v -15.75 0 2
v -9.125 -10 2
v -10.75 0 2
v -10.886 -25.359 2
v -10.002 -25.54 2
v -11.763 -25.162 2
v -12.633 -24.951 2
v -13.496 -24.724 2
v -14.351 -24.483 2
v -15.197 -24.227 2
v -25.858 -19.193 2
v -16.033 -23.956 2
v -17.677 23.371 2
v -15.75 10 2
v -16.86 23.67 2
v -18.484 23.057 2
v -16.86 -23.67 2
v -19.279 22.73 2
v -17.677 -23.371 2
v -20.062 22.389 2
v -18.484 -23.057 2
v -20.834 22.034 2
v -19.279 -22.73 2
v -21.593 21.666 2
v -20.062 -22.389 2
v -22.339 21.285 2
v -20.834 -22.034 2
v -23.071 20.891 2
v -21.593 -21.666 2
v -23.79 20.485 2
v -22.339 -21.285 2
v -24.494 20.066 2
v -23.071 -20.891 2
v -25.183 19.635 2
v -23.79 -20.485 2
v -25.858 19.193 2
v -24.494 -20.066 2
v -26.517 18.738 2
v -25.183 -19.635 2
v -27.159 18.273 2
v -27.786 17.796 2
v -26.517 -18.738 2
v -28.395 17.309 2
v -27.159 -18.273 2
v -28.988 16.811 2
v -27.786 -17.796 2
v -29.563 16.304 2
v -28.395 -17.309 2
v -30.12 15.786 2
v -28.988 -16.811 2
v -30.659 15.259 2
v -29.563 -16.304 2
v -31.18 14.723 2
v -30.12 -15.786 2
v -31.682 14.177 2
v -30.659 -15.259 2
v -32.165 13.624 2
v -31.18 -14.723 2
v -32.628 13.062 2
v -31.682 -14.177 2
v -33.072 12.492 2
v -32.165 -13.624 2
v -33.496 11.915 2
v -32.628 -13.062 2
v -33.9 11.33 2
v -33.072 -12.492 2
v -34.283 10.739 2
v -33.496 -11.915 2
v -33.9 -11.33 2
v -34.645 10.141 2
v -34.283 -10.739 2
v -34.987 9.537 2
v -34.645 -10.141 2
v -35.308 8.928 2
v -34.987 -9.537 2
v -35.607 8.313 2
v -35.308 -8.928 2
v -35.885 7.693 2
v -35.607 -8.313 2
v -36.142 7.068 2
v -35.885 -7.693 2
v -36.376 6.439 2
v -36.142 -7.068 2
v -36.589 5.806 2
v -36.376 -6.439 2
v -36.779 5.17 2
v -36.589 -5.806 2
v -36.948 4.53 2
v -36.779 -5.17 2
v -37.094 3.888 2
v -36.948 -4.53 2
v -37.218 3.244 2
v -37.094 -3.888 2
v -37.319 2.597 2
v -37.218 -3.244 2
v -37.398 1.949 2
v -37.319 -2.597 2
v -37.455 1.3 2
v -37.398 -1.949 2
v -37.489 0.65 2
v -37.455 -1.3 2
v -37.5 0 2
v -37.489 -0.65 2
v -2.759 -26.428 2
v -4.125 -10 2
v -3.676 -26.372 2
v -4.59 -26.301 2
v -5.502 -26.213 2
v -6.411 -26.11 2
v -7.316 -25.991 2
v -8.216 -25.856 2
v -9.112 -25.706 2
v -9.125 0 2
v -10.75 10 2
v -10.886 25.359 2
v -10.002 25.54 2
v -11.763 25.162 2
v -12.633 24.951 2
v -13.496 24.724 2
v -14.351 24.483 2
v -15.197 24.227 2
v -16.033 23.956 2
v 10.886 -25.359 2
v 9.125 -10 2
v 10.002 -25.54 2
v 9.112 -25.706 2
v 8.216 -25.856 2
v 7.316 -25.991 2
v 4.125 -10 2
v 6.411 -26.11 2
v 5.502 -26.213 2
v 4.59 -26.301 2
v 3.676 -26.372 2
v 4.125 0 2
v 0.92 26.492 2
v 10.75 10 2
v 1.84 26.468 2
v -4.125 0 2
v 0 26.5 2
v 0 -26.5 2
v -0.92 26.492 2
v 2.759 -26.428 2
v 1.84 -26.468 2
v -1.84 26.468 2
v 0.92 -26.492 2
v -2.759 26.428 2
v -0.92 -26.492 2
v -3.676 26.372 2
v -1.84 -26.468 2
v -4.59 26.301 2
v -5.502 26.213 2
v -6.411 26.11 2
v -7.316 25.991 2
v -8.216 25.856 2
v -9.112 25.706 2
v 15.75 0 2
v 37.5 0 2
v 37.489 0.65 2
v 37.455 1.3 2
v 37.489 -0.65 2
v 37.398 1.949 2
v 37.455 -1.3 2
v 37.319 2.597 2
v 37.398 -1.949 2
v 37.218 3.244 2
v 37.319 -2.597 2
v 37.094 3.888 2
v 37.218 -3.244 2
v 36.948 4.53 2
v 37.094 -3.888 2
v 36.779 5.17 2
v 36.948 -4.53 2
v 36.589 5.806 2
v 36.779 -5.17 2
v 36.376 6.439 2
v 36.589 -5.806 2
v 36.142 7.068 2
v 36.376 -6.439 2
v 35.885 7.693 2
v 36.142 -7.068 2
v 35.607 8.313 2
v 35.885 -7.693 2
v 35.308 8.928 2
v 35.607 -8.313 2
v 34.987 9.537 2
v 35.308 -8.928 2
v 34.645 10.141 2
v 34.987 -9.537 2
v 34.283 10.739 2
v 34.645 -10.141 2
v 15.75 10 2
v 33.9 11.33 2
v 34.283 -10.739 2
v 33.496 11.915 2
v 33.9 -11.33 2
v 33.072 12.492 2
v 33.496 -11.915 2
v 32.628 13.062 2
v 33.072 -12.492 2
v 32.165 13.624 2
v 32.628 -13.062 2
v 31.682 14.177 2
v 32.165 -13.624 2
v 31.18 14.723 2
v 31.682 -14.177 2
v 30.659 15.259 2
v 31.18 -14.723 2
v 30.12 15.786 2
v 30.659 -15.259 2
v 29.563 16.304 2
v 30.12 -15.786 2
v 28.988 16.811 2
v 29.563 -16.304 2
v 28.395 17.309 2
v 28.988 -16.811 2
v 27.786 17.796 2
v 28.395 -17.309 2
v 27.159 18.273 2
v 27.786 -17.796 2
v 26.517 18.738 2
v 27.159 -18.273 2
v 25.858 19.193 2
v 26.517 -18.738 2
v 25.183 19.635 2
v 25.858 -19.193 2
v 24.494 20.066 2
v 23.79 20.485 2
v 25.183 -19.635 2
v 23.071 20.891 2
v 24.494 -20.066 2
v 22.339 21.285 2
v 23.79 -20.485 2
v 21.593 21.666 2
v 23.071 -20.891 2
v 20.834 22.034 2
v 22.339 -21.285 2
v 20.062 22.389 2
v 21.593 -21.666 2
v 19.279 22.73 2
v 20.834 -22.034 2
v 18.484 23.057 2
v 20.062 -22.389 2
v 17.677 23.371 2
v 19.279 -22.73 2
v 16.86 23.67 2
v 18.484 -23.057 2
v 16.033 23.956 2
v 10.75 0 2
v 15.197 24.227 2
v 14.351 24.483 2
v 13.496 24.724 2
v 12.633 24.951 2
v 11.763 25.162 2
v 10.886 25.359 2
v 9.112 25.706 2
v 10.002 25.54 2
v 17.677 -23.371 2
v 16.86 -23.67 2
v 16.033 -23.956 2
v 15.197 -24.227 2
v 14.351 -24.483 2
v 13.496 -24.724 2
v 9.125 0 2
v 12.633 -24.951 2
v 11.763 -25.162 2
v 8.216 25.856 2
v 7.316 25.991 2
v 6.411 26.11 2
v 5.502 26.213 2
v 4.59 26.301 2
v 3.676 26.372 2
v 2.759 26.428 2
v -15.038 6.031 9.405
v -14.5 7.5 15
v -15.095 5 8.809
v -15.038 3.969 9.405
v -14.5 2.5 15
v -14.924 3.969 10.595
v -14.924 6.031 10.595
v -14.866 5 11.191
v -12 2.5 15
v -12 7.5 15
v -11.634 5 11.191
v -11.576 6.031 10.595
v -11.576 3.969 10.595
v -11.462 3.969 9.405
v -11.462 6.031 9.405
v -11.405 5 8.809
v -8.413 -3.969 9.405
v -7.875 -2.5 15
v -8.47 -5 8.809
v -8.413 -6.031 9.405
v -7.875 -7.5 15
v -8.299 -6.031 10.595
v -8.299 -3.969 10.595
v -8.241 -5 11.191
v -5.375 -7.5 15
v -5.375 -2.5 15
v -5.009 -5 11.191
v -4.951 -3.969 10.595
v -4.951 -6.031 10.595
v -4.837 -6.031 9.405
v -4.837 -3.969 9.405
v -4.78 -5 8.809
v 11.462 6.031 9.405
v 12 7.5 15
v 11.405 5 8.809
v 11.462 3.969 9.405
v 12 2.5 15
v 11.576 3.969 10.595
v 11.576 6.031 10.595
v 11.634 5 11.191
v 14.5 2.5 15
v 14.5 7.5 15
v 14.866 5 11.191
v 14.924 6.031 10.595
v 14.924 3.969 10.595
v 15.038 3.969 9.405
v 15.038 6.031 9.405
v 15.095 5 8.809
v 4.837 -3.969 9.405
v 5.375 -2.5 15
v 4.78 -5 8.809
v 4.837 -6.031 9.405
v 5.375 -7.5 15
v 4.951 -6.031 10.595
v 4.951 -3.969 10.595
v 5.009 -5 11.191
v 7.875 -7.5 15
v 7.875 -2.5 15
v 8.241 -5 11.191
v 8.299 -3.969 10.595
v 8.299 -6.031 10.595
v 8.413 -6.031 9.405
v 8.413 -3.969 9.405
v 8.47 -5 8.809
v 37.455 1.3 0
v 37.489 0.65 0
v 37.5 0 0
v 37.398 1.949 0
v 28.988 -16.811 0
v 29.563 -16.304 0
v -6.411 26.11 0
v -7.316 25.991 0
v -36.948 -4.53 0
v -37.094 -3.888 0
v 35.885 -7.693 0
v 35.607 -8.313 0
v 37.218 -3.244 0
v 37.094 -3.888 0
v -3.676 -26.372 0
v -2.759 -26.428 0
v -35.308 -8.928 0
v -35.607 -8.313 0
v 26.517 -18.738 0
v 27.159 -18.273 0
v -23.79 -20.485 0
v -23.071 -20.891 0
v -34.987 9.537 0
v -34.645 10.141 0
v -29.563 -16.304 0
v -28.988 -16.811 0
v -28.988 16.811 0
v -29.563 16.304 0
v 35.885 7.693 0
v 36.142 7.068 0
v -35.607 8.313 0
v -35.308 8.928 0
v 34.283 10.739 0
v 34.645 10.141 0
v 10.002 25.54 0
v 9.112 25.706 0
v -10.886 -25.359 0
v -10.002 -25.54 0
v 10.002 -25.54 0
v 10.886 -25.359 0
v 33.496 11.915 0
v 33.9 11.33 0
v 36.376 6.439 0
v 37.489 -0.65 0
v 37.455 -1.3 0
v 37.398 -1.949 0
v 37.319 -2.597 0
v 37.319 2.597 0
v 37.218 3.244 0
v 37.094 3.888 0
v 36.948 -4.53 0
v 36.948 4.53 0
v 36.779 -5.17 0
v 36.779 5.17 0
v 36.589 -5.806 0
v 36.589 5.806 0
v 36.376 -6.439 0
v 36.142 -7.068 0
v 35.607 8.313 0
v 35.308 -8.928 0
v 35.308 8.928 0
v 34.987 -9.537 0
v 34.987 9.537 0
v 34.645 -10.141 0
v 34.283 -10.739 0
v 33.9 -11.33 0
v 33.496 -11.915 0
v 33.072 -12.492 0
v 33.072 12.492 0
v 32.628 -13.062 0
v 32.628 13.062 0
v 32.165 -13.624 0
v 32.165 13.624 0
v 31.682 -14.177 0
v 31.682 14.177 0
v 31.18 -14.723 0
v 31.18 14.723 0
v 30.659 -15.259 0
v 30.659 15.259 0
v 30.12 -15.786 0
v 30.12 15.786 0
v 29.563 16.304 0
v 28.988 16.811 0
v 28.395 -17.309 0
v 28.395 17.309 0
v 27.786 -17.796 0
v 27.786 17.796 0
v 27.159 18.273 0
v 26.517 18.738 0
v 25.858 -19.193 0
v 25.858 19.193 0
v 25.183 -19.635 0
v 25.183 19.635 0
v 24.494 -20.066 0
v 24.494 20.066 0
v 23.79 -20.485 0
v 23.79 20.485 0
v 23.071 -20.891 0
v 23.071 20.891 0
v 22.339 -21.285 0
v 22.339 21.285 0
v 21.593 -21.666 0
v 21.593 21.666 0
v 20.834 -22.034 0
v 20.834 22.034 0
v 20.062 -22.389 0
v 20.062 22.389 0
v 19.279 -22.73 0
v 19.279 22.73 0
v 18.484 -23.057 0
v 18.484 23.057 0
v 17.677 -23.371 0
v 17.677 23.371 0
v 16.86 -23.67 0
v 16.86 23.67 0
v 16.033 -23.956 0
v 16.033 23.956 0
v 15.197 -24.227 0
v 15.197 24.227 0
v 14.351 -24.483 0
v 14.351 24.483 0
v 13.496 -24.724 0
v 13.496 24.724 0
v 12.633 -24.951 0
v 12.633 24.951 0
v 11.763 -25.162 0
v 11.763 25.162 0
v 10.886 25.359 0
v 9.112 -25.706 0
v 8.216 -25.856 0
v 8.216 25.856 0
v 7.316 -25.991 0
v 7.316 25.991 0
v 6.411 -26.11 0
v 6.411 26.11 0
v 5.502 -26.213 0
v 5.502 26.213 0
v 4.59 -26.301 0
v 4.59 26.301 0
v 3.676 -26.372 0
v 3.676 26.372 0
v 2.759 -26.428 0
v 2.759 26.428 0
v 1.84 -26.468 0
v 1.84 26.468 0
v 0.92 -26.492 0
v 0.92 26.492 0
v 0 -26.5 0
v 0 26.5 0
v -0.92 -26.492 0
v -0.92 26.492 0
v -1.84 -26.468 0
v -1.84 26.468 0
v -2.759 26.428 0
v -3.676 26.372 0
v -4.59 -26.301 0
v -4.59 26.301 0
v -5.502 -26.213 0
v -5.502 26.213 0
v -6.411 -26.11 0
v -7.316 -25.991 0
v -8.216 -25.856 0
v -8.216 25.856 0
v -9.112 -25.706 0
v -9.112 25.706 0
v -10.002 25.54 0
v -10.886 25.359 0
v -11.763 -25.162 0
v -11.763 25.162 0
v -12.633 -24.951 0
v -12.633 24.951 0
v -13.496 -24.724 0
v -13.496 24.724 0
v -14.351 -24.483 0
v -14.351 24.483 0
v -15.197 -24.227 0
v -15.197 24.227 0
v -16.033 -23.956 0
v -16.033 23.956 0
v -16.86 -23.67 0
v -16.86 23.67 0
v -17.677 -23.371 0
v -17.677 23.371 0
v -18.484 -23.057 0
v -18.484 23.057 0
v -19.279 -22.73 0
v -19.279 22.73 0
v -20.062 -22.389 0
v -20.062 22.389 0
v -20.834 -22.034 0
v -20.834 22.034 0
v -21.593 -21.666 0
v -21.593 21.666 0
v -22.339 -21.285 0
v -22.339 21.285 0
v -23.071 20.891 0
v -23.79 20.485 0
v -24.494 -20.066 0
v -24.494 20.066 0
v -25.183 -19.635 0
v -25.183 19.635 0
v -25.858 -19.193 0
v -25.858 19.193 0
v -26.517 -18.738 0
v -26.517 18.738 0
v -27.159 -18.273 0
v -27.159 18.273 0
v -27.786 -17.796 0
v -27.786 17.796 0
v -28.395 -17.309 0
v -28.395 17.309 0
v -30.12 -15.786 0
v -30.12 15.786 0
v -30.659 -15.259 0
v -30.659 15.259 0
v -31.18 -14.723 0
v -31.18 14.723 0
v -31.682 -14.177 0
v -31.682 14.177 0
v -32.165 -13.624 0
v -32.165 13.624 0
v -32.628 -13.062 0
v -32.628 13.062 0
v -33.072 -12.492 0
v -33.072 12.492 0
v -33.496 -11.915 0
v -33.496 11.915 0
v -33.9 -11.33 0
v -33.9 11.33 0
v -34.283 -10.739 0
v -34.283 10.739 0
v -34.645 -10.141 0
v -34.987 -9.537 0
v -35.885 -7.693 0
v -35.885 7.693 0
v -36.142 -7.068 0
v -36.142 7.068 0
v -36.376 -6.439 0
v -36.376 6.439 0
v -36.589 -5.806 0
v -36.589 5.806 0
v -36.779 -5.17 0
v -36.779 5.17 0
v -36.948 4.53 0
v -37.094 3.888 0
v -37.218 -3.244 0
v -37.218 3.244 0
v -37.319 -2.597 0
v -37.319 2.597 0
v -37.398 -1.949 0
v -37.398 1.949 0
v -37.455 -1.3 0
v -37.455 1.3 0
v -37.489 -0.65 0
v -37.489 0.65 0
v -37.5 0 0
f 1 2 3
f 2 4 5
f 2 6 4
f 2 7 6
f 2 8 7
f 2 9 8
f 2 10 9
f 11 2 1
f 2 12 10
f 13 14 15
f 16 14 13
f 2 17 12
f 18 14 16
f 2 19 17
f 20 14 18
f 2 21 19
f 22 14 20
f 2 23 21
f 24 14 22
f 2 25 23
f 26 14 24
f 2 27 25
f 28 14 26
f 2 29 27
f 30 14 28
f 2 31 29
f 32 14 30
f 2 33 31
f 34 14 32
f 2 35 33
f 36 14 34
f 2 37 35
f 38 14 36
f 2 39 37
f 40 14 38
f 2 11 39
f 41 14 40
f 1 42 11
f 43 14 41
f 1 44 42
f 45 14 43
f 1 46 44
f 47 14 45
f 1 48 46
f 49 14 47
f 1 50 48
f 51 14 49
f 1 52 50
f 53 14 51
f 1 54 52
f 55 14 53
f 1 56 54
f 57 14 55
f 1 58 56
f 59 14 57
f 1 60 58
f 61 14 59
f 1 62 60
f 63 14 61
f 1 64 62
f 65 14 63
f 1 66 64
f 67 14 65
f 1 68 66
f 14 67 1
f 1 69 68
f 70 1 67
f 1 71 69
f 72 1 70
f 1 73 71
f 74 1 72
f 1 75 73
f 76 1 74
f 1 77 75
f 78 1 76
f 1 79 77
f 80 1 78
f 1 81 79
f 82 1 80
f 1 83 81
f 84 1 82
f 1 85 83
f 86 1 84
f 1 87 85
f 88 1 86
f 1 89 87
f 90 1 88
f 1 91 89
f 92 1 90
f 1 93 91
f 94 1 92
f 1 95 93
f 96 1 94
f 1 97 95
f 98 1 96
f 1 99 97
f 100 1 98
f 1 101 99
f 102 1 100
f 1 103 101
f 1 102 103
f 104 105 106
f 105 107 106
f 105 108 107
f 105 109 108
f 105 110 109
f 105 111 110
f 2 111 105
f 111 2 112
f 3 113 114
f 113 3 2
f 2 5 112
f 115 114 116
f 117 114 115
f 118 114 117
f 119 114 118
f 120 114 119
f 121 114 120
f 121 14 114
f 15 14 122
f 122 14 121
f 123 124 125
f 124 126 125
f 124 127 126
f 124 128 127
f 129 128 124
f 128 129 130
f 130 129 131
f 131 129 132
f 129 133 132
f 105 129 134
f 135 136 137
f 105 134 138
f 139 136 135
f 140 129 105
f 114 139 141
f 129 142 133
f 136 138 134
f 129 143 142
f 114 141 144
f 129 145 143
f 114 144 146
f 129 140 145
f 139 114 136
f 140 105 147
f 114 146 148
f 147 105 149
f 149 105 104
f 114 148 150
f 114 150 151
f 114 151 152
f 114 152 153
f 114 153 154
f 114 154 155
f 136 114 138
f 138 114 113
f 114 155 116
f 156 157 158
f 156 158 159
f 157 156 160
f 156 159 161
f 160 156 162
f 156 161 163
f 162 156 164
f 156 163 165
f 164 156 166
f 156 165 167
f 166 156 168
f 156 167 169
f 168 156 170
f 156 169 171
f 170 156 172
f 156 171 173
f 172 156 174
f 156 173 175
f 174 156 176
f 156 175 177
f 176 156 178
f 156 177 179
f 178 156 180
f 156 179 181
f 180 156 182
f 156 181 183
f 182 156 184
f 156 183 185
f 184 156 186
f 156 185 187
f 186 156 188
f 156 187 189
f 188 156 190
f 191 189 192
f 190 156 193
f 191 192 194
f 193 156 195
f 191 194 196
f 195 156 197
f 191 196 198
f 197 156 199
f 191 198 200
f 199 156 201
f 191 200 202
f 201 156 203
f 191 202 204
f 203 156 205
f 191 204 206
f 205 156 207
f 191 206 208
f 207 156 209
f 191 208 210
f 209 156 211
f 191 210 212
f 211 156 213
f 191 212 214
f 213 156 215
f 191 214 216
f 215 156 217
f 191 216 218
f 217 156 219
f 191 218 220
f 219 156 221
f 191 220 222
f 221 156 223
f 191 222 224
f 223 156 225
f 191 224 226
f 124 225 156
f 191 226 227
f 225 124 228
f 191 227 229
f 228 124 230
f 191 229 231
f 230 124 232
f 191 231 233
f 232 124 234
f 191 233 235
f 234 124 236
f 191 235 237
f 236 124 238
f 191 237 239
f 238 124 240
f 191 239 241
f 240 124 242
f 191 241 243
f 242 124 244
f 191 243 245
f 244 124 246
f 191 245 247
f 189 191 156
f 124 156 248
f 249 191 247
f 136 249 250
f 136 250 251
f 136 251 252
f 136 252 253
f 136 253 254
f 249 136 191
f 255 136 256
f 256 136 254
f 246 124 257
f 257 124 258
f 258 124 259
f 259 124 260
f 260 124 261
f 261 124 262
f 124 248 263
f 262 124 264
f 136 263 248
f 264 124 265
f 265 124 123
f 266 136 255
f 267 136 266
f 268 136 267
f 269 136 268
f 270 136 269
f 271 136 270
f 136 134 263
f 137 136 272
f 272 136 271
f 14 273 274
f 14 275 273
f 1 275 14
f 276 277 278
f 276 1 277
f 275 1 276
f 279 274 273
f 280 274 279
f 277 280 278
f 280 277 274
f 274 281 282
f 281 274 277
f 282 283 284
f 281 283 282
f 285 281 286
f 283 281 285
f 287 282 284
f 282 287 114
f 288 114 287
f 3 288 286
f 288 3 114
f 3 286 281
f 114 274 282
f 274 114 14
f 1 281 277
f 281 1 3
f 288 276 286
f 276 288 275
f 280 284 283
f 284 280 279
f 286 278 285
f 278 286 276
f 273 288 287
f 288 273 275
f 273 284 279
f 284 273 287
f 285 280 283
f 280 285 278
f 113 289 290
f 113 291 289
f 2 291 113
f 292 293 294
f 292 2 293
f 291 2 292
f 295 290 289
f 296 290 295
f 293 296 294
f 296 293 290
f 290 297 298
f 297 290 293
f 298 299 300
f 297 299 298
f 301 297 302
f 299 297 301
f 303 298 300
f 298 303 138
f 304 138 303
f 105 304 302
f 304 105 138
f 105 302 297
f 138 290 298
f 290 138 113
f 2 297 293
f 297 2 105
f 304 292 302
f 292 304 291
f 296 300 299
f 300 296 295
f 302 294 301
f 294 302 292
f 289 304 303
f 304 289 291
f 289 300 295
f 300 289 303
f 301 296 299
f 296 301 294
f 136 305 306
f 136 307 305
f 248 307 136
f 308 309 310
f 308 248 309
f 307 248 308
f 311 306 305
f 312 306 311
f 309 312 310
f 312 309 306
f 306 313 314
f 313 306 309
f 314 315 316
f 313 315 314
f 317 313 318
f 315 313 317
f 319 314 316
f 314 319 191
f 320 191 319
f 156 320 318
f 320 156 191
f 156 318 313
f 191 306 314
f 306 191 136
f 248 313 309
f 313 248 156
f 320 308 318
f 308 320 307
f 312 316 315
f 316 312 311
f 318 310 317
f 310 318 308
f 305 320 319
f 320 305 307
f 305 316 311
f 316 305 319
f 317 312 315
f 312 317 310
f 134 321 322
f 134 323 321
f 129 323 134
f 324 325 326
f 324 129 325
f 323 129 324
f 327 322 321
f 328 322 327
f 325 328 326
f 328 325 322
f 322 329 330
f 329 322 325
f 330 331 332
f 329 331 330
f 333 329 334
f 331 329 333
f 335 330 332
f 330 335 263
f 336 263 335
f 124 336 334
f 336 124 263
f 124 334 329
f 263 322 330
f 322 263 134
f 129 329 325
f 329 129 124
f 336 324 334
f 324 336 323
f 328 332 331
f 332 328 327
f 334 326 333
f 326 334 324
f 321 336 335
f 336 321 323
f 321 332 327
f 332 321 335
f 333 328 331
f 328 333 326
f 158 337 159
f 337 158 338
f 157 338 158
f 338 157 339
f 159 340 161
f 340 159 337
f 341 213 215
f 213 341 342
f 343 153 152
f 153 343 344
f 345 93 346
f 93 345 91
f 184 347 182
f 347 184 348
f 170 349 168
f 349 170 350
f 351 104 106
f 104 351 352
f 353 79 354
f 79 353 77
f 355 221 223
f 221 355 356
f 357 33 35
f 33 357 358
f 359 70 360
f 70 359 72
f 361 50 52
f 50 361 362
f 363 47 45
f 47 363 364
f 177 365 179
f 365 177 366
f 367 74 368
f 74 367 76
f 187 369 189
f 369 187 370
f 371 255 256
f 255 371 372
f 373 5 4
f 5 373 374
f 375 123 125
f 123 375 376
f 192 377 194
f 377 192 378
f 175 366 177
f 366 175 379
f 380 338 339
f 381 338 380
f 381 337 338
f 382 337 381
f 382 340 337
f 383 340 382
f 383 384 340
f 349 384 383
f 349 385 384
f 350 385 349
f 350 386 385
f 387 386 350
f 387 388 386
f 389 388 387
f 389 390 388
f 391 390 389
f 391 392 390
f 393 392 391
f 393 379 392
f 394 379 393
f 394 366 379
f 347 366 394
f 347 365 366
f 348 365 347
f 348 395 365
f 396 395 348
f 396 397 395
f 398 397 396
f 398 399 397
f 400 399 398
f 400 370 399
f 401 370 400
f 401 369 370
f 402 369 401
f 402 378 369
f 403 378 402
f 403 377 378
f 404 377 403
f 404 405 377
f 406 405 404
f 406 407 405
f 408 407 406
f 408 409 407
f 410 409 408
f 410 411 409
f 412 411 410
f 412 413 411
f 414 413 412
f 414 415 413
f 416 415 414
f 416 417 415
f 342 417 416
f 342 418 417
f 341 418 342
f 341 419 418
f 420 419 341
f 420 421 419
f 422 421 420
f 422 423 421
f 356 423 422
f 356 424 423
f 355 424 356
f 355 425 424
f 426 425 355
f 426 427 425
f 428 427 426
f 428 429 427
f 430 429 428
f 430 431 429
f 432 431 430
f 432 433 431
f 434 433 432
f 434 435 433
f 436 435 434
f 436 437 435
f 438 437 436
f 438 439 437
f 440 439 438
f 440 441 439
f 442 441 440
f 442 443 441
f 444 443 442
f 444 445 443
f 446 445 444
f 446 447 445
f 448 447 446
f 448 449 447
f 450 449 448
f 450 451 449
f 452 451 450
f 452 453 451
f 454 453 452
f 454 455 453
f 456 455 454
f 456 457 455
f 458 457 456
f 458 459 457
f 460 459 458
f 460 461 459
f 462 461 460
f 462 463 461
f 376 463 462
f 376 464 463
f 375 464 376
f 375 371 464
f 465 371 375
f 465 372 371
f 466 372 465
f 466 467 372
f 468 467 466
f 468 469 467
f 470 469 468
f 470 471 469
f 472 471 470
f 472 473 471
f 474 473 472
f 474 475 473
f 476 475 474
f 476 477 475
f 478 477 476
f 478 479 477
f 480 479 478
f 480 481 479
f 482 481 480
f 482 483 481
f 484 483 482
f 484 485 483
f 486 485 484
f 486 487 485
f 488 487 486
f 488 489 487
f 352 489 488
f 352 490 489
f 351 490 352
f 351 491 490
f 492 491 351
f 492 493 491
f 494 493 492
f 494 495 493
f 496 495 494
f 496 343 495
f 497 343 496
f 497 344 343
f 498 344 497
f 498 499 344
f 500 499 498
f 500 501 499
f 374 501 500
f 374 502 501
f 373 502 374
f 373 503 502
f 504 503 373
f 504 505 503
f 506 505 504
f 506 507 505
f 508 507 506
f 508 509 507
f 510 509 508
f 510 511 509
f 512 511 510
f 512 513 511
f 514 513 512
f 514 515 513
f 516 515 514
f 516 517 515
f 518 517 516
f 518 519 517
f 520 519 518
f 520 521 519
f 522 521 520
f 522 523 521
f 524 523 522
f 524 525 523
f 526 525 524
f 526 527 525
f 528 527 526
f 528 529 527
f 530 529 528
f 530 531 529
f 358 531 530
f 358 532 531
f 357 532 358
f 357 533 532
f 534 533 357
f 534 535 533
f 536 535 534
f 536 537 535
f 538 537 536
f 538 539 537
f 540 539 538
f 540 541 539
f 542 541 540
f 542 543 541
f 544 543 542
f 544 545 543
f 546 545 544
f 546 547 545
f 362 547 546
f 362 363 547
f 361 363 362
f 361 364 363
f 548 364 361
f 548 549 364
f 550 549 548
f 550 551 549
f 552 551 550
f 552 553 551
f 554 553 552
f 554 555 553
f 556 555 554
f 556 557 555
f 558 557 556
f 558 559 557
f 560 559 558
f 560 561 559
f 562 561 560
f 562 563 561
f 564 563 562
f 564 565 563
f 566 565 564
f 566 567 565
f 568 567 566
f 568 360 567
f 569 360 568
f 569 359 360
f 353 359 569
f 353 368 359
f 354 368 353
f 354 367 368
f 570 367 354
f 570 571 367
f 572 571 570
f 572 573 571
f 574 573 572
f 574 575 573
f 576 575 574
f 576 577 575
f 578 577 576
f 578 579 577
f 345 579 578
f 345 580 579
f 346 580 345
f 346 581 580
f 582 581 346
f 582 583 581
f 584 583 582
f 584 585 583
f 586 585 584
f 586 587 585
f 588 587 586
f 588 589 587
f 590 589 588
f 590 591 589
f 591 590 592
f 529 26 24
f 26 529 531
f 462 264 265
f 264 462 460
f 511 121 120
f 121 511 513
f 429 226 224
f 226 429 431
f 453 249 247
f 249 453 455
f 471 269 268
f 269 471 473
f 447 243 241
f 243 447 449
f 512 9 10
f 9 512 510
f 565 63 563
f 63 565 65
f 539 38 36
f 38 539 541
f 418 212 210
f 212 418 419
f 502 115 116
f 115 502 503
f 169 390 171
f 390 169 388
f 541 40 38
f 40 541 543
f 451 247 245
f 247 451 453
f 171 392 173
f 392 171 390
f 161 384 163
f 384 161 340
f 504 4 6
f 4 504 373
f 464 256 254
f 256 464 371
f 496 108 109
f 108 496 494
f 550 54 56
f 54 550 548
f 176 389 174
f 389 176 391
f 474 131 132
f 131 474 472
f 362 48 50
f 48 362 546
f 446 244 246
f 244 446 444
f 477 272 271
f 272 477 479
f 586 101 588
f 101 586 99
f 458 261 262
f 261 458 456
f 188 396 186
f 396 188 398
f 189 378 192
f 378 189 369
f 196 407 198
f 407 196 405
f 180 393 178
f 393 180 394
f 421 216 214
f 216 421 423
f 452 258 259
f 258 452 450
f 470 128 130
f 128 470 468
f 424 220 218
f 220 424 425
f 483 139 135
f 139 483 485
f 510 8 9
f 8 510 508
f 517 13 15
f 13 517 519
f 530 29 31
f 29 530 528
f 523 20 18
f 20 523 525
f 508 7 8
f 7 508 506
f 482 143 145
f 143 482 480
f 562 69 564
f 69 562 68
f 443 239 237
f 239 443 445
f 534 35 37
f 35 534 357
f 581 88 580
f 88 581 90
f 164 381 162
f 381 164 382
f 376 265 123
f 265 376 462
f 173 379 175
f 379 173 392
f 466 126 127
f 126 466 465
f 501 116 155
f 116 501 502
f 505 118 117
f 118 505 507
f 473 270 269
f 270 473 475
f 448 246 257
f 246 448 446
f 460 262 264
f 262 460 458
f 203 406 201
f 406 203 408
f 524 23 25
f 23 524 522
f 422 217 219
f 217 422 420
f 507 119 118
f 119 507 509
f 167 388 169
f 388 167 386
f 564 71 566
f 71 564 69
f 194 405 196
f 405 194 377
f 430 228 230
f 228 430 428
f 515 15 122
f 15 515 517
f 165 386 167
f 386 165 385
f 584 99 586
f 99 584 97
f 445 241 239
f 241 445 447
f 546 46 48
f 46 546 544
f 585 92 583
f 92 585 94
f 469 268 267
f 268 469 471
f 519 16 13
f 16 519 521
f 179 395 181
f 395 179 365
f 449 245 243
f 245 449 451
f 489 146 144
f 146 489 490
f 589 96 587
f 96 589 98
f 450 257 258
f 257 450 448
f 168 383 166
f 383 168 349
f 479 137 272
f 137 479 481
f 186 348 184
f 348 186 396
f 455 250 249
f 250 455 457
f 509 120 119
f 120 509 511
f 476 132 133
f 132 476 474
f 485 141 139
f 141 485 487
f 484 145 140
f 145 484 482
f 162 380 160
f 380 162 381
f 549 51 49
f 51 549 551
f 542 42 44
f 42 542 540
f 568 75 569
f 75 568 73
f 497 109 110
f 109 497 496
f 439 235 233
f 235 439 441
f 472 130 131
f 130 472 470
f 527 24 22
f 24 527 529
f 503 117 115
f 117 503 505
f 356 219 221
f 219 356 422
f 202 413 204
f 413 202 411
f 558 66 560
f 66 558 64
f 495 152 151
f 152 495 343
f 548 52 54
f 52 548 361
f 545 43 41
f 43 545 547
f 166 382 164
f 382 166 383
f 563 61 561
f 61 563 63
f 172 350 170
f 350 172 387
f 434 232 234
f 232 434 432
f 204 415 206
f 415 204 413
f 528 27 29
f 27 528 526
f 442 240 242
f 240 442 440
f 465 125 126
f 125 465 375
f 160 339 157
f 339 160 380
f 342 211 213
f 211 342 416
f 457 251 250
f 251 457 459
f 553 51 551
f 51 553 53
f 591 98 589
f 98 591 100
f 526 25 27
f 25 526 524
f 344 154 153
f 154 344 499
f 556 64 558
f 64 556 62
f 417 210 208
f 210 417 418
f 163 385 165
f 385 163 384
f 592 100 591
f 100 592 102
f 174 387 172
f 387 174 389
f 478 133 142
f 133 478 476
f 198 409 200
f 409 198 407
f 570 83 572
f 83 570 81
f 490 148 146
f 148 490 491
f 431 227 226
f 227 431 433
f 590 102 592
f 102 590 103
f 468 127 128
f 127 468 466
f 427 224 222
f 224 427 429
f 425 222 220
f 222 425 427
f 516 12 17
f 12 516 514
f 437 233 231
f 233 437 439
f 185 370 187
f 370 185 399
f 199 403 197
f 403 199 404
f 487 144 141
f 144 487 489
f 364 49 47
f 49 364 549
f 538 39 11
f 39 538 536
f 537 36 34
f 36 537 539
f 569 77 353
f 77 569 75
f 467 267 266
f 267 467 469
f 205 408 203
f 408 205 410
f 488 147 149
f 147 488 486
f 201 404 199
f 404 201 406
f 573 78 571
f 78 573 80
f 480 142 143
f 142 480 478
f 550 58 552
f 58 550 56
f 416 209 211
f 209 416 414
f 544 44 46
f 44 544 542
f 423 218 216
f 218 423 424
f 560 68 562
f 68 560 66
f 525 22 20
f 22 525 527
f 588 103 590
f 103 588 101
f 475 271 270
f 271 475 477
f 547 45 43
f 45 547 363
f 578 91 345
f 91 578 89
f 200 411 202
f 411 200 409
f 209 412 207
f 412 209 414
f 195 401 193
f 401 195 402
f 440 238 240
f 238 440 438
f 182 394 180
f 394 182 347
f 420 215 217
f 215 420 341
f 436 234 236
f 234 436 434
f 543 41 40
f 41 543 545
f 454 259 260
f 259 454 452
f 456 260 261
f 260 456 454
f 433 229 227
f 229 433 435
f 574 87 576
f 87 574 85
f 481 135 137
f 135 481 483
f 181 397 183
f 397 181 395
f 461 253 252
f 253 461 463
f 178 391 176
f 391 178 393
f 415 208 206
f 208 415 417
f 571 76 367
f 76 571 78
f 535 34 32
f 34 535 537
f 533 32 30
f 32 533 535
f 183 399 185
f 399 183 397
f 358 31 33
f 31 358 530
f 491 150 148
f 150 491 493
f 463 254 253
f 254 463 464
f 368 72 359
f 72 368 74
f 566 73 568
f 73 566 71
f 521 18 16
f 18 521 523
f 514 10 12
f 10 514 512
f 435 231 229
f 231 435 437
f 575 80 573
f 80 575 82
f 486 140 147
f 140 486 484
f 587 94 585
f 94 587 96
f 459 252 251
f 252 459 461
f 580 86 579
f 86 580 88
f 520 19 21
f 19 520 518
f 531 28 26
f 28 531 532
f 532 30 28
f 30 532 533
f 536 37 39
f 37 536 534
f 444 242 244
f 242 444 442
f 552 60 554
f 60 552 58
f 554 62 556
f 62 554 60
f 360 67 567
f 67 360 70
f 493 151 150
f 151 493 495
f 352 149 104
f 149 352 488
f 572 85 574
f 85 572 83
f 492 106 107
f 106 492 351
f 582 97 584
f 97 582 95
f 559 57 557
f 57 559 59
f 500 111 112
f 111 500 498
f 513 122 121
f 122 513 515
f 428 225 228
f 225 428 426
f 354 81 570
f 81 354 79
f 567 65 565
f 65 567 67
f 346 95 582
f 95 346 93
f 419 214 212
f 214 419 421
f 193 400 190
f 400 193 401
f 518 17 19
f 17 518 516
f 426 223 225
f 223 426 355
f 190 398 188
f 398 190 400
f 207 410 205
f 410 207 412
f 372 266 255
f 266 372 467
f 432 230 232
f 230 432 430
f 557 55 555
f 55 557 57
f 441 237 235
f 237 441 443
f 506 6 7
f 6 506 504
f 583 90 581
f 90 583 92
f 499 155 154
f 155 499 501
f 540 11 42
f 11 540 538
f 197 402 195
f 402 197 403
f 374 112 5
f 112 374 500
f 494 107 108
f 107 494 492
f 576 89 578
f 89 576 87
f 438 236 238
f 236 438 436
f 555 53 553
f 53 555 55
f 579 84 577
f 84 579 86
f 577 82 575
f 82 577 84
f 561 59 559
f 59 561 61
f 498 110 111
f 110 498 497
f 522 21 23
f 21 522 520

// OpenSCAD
incup = 53/2;
wallthk = 1.6;
cupside = incup + wallthk;
fudge = 0.55; //0.7 on first try
airgap_outside = cupside + wallthk + fudge*2;
outcup = airgap_outside + wallthk;

cupholder_in = cupside + fudge;
cupholder_wall = cupholder_in + wallthk;
cupholder_gap = cupholder_wall + wallthk + fudge*2;
cupholder_outside = cupholder_gap + wallthk;
echo("cupholder has diameter of:", cupholder_outside*2);
cup_travel = 10;
cup_extension = 25;
cup_base_ht = 20;
cup_rim_thk = 2;
cup_ht = cup_base_ht + cup_extension + cup_travel + cup_rim_thk;
outcup_ht = cup_ht - cup_travel - cup_extension;
cupholder_inside_ht = outcup_ht - fudge;
cupholder_outside_ht = cupholder_inside_ht + cup_travel + fudge;

spring_rad = 4.5;
spring_len = 30;  // compressed

//springholder();
//fan_cut();
//generic_side();
//sucker_side();
flap();

module twogirls(){
scale([1, (incup*2 + 22)/(incup*2), 1]){
    cup();
translate([cupholder_outside*2, 0, 0])
    cupholder();
}

}
module rimjob(ht=1, inner=1, outer=2){
    difference(){
        cylinder(r=outer, h=ht, $fn=384);
        translate([0,0,-0.1])
            cylinder(r=inner, h=ht+0.2, $fn=384);
    }
}

module cup(){
    //base
    rimjob(ht=cup_rim_thk, inner=incup, outer=outcup);
    //inner cup
    rimjob(ht=cup_ht, inner=incup, outer=cupside);
    //outer cup
    rimjob(ht=outcup_ht, inner=airgap_outside, outer=outcup);
}

module cupholder(){
    //base
    rimjob(ht=cup_rim_thk, inner=cupholder_in, outer=cupholder_outside);
    //inner ring
    rimjob(ht=cupholder_inside_ht, inner=cupholder_in, outer=cupholder_wall);
    // outer ring
    rimjob(ht=cupholder_outside_ht, inner=cupholder_gap, outer=cupholder_outside);
}
   

module springholder(){
    sfact = (incup*2 + 22)/(incup*2);
    center_to_rim = sfact * (airgap_outside - 0.9);
    difference(){
        union(){
            scale([1, sfact, 1]){
                echo("scale factor is:", sfact, "mm to center rim:", center_to_rim);
                rimjob(ht=cup_rim_thk, inner=incup, outer=cupholder_outside+wallthk);
                #rimjob(ht=cup_rim_thk+.1, inner=cupholder_gap, outer=cupholder_outside);
                }
             for (i=[1,-1]){
                translate([0,i*center_to_rim,0])
                    scale([1.5, 1, 1])
                        cylinder(r=spring_rad + 1, h=spring_len+1.7, $fn=64);
             }
         }
         for (i=[1,-1]){
             // spring holes
            translate([0,i*(center_to_rim),-0.1])
                    cylinder(r=spring_rad, h=spring_len+0.1, $fn=64);
             // door hinge holes
            translate([5.5*i,-50, 8])
                rotate([-90,0,0])
                    #cylinder(r=0.9, h=100, $fn=6);
         }

    }
}


module fan_cut(){
    corner_rad = 7.5;
    total_len = 120.33;
    straight = total_len - corner_rad*2;
    thk = 4.3;
    center_chunk = 23;
    fanrad = 60.35;
    innerfan = 117.4/2;
    inner_plate_width = cupholder_outside_ht*2+wallthk*2;
    alum_side = total_len;
    alum_thk = 2.4;
    translate([0,-thk*2,corner_rad/2+wallthk]) rotate([90,0,0]){
        cube([straight, corner_rad, thk], center=true);
        for (i=[1,-1]){
            translate([straight/2*i, corner_rad/2, 0])
                cylinder(r=corner_rad, h=thk, center=true, $fn=36);
        }
        for (i=[0,1]){
        mirror([i,0,0])
            translate([straight/2, corner_rad/2, -thk*2]) rotate([0,0,-45])
                cube([14,corner_rad, inner_plate_width + thk*5]);
        }
        translate([0,-corner_rad/4,-thk])
            cube([center_chunk, corner_rad/2, thk*2], center=true);
       translate([0, fanrad - corner_rad/2, -thk]){
           cylinder(r=fanrad, h=thk*2, center=true, $fn=128);
           cylinder(r=innerfan, h=inner_plate_width + thk*1.5, center=false, $fn=128);
           translate([-alum_side/2,-alum_side/2,inner_plate_width + thk*2.65])
                cube([alum_side, alum_side, alum_thk]);
       }

   }
}

module generic_side(total_len=120.33, wdth=87, thk=4.3){
    difference(){
        translate([-total_len/2, -wdth, 0]){
            cube([total_len, wdth, thk]);
        }
        fan_cut();
    }
}

module sucker_side(thk=4.3, cntr=46){
    sfact = (incup*2 + 22)/(incup*2);
    difference(){
        generic_side();
        translate([0,-cntr, thk - cup_rim_thk]){
            scale([sfact, 1, 1]){
                cylinder(r=cupholder_outside+wallthk, h=cup_rim_thk+0.1, $fn=256);
            }
        }
        translate([0,-cntr,-0.1]) scale([sfact, 1, 1])
            cylinder(r=cupholder_outside, h=thk, $fn=256);
    }
}

module post(hole_ht=8, hole_size=1){
    difference(){
        linear_extrude(scale=.5, height=hole_ht+5){
            square([5,10], center=true);
        }
    translate([0,0,hole_ht]) rotate([0,90,0])
        cylinder(r=hole_size/2, h=10, $fn=6, center=true);
    }
}
        
module flap(offset=5, ht=8, size=(3/32)*25.4){
    sfact = (incup*2 + 22)/(incup*2);
    scale([sfact, 1, 1])
        cylinder(r=incup, h=cup_rim_thk, $fn=256);
    for (i=[-1,1]){
        translate([incup*0.5 * i, offset, cup_rim_thk])
            post(hole_ht=8, hole_size=size);
        translate([incup*0.25 * i, -offset, cup_rim_thk])
            post(hole_ht=8, hole_size=size);
    }
}
    
    
            
        
